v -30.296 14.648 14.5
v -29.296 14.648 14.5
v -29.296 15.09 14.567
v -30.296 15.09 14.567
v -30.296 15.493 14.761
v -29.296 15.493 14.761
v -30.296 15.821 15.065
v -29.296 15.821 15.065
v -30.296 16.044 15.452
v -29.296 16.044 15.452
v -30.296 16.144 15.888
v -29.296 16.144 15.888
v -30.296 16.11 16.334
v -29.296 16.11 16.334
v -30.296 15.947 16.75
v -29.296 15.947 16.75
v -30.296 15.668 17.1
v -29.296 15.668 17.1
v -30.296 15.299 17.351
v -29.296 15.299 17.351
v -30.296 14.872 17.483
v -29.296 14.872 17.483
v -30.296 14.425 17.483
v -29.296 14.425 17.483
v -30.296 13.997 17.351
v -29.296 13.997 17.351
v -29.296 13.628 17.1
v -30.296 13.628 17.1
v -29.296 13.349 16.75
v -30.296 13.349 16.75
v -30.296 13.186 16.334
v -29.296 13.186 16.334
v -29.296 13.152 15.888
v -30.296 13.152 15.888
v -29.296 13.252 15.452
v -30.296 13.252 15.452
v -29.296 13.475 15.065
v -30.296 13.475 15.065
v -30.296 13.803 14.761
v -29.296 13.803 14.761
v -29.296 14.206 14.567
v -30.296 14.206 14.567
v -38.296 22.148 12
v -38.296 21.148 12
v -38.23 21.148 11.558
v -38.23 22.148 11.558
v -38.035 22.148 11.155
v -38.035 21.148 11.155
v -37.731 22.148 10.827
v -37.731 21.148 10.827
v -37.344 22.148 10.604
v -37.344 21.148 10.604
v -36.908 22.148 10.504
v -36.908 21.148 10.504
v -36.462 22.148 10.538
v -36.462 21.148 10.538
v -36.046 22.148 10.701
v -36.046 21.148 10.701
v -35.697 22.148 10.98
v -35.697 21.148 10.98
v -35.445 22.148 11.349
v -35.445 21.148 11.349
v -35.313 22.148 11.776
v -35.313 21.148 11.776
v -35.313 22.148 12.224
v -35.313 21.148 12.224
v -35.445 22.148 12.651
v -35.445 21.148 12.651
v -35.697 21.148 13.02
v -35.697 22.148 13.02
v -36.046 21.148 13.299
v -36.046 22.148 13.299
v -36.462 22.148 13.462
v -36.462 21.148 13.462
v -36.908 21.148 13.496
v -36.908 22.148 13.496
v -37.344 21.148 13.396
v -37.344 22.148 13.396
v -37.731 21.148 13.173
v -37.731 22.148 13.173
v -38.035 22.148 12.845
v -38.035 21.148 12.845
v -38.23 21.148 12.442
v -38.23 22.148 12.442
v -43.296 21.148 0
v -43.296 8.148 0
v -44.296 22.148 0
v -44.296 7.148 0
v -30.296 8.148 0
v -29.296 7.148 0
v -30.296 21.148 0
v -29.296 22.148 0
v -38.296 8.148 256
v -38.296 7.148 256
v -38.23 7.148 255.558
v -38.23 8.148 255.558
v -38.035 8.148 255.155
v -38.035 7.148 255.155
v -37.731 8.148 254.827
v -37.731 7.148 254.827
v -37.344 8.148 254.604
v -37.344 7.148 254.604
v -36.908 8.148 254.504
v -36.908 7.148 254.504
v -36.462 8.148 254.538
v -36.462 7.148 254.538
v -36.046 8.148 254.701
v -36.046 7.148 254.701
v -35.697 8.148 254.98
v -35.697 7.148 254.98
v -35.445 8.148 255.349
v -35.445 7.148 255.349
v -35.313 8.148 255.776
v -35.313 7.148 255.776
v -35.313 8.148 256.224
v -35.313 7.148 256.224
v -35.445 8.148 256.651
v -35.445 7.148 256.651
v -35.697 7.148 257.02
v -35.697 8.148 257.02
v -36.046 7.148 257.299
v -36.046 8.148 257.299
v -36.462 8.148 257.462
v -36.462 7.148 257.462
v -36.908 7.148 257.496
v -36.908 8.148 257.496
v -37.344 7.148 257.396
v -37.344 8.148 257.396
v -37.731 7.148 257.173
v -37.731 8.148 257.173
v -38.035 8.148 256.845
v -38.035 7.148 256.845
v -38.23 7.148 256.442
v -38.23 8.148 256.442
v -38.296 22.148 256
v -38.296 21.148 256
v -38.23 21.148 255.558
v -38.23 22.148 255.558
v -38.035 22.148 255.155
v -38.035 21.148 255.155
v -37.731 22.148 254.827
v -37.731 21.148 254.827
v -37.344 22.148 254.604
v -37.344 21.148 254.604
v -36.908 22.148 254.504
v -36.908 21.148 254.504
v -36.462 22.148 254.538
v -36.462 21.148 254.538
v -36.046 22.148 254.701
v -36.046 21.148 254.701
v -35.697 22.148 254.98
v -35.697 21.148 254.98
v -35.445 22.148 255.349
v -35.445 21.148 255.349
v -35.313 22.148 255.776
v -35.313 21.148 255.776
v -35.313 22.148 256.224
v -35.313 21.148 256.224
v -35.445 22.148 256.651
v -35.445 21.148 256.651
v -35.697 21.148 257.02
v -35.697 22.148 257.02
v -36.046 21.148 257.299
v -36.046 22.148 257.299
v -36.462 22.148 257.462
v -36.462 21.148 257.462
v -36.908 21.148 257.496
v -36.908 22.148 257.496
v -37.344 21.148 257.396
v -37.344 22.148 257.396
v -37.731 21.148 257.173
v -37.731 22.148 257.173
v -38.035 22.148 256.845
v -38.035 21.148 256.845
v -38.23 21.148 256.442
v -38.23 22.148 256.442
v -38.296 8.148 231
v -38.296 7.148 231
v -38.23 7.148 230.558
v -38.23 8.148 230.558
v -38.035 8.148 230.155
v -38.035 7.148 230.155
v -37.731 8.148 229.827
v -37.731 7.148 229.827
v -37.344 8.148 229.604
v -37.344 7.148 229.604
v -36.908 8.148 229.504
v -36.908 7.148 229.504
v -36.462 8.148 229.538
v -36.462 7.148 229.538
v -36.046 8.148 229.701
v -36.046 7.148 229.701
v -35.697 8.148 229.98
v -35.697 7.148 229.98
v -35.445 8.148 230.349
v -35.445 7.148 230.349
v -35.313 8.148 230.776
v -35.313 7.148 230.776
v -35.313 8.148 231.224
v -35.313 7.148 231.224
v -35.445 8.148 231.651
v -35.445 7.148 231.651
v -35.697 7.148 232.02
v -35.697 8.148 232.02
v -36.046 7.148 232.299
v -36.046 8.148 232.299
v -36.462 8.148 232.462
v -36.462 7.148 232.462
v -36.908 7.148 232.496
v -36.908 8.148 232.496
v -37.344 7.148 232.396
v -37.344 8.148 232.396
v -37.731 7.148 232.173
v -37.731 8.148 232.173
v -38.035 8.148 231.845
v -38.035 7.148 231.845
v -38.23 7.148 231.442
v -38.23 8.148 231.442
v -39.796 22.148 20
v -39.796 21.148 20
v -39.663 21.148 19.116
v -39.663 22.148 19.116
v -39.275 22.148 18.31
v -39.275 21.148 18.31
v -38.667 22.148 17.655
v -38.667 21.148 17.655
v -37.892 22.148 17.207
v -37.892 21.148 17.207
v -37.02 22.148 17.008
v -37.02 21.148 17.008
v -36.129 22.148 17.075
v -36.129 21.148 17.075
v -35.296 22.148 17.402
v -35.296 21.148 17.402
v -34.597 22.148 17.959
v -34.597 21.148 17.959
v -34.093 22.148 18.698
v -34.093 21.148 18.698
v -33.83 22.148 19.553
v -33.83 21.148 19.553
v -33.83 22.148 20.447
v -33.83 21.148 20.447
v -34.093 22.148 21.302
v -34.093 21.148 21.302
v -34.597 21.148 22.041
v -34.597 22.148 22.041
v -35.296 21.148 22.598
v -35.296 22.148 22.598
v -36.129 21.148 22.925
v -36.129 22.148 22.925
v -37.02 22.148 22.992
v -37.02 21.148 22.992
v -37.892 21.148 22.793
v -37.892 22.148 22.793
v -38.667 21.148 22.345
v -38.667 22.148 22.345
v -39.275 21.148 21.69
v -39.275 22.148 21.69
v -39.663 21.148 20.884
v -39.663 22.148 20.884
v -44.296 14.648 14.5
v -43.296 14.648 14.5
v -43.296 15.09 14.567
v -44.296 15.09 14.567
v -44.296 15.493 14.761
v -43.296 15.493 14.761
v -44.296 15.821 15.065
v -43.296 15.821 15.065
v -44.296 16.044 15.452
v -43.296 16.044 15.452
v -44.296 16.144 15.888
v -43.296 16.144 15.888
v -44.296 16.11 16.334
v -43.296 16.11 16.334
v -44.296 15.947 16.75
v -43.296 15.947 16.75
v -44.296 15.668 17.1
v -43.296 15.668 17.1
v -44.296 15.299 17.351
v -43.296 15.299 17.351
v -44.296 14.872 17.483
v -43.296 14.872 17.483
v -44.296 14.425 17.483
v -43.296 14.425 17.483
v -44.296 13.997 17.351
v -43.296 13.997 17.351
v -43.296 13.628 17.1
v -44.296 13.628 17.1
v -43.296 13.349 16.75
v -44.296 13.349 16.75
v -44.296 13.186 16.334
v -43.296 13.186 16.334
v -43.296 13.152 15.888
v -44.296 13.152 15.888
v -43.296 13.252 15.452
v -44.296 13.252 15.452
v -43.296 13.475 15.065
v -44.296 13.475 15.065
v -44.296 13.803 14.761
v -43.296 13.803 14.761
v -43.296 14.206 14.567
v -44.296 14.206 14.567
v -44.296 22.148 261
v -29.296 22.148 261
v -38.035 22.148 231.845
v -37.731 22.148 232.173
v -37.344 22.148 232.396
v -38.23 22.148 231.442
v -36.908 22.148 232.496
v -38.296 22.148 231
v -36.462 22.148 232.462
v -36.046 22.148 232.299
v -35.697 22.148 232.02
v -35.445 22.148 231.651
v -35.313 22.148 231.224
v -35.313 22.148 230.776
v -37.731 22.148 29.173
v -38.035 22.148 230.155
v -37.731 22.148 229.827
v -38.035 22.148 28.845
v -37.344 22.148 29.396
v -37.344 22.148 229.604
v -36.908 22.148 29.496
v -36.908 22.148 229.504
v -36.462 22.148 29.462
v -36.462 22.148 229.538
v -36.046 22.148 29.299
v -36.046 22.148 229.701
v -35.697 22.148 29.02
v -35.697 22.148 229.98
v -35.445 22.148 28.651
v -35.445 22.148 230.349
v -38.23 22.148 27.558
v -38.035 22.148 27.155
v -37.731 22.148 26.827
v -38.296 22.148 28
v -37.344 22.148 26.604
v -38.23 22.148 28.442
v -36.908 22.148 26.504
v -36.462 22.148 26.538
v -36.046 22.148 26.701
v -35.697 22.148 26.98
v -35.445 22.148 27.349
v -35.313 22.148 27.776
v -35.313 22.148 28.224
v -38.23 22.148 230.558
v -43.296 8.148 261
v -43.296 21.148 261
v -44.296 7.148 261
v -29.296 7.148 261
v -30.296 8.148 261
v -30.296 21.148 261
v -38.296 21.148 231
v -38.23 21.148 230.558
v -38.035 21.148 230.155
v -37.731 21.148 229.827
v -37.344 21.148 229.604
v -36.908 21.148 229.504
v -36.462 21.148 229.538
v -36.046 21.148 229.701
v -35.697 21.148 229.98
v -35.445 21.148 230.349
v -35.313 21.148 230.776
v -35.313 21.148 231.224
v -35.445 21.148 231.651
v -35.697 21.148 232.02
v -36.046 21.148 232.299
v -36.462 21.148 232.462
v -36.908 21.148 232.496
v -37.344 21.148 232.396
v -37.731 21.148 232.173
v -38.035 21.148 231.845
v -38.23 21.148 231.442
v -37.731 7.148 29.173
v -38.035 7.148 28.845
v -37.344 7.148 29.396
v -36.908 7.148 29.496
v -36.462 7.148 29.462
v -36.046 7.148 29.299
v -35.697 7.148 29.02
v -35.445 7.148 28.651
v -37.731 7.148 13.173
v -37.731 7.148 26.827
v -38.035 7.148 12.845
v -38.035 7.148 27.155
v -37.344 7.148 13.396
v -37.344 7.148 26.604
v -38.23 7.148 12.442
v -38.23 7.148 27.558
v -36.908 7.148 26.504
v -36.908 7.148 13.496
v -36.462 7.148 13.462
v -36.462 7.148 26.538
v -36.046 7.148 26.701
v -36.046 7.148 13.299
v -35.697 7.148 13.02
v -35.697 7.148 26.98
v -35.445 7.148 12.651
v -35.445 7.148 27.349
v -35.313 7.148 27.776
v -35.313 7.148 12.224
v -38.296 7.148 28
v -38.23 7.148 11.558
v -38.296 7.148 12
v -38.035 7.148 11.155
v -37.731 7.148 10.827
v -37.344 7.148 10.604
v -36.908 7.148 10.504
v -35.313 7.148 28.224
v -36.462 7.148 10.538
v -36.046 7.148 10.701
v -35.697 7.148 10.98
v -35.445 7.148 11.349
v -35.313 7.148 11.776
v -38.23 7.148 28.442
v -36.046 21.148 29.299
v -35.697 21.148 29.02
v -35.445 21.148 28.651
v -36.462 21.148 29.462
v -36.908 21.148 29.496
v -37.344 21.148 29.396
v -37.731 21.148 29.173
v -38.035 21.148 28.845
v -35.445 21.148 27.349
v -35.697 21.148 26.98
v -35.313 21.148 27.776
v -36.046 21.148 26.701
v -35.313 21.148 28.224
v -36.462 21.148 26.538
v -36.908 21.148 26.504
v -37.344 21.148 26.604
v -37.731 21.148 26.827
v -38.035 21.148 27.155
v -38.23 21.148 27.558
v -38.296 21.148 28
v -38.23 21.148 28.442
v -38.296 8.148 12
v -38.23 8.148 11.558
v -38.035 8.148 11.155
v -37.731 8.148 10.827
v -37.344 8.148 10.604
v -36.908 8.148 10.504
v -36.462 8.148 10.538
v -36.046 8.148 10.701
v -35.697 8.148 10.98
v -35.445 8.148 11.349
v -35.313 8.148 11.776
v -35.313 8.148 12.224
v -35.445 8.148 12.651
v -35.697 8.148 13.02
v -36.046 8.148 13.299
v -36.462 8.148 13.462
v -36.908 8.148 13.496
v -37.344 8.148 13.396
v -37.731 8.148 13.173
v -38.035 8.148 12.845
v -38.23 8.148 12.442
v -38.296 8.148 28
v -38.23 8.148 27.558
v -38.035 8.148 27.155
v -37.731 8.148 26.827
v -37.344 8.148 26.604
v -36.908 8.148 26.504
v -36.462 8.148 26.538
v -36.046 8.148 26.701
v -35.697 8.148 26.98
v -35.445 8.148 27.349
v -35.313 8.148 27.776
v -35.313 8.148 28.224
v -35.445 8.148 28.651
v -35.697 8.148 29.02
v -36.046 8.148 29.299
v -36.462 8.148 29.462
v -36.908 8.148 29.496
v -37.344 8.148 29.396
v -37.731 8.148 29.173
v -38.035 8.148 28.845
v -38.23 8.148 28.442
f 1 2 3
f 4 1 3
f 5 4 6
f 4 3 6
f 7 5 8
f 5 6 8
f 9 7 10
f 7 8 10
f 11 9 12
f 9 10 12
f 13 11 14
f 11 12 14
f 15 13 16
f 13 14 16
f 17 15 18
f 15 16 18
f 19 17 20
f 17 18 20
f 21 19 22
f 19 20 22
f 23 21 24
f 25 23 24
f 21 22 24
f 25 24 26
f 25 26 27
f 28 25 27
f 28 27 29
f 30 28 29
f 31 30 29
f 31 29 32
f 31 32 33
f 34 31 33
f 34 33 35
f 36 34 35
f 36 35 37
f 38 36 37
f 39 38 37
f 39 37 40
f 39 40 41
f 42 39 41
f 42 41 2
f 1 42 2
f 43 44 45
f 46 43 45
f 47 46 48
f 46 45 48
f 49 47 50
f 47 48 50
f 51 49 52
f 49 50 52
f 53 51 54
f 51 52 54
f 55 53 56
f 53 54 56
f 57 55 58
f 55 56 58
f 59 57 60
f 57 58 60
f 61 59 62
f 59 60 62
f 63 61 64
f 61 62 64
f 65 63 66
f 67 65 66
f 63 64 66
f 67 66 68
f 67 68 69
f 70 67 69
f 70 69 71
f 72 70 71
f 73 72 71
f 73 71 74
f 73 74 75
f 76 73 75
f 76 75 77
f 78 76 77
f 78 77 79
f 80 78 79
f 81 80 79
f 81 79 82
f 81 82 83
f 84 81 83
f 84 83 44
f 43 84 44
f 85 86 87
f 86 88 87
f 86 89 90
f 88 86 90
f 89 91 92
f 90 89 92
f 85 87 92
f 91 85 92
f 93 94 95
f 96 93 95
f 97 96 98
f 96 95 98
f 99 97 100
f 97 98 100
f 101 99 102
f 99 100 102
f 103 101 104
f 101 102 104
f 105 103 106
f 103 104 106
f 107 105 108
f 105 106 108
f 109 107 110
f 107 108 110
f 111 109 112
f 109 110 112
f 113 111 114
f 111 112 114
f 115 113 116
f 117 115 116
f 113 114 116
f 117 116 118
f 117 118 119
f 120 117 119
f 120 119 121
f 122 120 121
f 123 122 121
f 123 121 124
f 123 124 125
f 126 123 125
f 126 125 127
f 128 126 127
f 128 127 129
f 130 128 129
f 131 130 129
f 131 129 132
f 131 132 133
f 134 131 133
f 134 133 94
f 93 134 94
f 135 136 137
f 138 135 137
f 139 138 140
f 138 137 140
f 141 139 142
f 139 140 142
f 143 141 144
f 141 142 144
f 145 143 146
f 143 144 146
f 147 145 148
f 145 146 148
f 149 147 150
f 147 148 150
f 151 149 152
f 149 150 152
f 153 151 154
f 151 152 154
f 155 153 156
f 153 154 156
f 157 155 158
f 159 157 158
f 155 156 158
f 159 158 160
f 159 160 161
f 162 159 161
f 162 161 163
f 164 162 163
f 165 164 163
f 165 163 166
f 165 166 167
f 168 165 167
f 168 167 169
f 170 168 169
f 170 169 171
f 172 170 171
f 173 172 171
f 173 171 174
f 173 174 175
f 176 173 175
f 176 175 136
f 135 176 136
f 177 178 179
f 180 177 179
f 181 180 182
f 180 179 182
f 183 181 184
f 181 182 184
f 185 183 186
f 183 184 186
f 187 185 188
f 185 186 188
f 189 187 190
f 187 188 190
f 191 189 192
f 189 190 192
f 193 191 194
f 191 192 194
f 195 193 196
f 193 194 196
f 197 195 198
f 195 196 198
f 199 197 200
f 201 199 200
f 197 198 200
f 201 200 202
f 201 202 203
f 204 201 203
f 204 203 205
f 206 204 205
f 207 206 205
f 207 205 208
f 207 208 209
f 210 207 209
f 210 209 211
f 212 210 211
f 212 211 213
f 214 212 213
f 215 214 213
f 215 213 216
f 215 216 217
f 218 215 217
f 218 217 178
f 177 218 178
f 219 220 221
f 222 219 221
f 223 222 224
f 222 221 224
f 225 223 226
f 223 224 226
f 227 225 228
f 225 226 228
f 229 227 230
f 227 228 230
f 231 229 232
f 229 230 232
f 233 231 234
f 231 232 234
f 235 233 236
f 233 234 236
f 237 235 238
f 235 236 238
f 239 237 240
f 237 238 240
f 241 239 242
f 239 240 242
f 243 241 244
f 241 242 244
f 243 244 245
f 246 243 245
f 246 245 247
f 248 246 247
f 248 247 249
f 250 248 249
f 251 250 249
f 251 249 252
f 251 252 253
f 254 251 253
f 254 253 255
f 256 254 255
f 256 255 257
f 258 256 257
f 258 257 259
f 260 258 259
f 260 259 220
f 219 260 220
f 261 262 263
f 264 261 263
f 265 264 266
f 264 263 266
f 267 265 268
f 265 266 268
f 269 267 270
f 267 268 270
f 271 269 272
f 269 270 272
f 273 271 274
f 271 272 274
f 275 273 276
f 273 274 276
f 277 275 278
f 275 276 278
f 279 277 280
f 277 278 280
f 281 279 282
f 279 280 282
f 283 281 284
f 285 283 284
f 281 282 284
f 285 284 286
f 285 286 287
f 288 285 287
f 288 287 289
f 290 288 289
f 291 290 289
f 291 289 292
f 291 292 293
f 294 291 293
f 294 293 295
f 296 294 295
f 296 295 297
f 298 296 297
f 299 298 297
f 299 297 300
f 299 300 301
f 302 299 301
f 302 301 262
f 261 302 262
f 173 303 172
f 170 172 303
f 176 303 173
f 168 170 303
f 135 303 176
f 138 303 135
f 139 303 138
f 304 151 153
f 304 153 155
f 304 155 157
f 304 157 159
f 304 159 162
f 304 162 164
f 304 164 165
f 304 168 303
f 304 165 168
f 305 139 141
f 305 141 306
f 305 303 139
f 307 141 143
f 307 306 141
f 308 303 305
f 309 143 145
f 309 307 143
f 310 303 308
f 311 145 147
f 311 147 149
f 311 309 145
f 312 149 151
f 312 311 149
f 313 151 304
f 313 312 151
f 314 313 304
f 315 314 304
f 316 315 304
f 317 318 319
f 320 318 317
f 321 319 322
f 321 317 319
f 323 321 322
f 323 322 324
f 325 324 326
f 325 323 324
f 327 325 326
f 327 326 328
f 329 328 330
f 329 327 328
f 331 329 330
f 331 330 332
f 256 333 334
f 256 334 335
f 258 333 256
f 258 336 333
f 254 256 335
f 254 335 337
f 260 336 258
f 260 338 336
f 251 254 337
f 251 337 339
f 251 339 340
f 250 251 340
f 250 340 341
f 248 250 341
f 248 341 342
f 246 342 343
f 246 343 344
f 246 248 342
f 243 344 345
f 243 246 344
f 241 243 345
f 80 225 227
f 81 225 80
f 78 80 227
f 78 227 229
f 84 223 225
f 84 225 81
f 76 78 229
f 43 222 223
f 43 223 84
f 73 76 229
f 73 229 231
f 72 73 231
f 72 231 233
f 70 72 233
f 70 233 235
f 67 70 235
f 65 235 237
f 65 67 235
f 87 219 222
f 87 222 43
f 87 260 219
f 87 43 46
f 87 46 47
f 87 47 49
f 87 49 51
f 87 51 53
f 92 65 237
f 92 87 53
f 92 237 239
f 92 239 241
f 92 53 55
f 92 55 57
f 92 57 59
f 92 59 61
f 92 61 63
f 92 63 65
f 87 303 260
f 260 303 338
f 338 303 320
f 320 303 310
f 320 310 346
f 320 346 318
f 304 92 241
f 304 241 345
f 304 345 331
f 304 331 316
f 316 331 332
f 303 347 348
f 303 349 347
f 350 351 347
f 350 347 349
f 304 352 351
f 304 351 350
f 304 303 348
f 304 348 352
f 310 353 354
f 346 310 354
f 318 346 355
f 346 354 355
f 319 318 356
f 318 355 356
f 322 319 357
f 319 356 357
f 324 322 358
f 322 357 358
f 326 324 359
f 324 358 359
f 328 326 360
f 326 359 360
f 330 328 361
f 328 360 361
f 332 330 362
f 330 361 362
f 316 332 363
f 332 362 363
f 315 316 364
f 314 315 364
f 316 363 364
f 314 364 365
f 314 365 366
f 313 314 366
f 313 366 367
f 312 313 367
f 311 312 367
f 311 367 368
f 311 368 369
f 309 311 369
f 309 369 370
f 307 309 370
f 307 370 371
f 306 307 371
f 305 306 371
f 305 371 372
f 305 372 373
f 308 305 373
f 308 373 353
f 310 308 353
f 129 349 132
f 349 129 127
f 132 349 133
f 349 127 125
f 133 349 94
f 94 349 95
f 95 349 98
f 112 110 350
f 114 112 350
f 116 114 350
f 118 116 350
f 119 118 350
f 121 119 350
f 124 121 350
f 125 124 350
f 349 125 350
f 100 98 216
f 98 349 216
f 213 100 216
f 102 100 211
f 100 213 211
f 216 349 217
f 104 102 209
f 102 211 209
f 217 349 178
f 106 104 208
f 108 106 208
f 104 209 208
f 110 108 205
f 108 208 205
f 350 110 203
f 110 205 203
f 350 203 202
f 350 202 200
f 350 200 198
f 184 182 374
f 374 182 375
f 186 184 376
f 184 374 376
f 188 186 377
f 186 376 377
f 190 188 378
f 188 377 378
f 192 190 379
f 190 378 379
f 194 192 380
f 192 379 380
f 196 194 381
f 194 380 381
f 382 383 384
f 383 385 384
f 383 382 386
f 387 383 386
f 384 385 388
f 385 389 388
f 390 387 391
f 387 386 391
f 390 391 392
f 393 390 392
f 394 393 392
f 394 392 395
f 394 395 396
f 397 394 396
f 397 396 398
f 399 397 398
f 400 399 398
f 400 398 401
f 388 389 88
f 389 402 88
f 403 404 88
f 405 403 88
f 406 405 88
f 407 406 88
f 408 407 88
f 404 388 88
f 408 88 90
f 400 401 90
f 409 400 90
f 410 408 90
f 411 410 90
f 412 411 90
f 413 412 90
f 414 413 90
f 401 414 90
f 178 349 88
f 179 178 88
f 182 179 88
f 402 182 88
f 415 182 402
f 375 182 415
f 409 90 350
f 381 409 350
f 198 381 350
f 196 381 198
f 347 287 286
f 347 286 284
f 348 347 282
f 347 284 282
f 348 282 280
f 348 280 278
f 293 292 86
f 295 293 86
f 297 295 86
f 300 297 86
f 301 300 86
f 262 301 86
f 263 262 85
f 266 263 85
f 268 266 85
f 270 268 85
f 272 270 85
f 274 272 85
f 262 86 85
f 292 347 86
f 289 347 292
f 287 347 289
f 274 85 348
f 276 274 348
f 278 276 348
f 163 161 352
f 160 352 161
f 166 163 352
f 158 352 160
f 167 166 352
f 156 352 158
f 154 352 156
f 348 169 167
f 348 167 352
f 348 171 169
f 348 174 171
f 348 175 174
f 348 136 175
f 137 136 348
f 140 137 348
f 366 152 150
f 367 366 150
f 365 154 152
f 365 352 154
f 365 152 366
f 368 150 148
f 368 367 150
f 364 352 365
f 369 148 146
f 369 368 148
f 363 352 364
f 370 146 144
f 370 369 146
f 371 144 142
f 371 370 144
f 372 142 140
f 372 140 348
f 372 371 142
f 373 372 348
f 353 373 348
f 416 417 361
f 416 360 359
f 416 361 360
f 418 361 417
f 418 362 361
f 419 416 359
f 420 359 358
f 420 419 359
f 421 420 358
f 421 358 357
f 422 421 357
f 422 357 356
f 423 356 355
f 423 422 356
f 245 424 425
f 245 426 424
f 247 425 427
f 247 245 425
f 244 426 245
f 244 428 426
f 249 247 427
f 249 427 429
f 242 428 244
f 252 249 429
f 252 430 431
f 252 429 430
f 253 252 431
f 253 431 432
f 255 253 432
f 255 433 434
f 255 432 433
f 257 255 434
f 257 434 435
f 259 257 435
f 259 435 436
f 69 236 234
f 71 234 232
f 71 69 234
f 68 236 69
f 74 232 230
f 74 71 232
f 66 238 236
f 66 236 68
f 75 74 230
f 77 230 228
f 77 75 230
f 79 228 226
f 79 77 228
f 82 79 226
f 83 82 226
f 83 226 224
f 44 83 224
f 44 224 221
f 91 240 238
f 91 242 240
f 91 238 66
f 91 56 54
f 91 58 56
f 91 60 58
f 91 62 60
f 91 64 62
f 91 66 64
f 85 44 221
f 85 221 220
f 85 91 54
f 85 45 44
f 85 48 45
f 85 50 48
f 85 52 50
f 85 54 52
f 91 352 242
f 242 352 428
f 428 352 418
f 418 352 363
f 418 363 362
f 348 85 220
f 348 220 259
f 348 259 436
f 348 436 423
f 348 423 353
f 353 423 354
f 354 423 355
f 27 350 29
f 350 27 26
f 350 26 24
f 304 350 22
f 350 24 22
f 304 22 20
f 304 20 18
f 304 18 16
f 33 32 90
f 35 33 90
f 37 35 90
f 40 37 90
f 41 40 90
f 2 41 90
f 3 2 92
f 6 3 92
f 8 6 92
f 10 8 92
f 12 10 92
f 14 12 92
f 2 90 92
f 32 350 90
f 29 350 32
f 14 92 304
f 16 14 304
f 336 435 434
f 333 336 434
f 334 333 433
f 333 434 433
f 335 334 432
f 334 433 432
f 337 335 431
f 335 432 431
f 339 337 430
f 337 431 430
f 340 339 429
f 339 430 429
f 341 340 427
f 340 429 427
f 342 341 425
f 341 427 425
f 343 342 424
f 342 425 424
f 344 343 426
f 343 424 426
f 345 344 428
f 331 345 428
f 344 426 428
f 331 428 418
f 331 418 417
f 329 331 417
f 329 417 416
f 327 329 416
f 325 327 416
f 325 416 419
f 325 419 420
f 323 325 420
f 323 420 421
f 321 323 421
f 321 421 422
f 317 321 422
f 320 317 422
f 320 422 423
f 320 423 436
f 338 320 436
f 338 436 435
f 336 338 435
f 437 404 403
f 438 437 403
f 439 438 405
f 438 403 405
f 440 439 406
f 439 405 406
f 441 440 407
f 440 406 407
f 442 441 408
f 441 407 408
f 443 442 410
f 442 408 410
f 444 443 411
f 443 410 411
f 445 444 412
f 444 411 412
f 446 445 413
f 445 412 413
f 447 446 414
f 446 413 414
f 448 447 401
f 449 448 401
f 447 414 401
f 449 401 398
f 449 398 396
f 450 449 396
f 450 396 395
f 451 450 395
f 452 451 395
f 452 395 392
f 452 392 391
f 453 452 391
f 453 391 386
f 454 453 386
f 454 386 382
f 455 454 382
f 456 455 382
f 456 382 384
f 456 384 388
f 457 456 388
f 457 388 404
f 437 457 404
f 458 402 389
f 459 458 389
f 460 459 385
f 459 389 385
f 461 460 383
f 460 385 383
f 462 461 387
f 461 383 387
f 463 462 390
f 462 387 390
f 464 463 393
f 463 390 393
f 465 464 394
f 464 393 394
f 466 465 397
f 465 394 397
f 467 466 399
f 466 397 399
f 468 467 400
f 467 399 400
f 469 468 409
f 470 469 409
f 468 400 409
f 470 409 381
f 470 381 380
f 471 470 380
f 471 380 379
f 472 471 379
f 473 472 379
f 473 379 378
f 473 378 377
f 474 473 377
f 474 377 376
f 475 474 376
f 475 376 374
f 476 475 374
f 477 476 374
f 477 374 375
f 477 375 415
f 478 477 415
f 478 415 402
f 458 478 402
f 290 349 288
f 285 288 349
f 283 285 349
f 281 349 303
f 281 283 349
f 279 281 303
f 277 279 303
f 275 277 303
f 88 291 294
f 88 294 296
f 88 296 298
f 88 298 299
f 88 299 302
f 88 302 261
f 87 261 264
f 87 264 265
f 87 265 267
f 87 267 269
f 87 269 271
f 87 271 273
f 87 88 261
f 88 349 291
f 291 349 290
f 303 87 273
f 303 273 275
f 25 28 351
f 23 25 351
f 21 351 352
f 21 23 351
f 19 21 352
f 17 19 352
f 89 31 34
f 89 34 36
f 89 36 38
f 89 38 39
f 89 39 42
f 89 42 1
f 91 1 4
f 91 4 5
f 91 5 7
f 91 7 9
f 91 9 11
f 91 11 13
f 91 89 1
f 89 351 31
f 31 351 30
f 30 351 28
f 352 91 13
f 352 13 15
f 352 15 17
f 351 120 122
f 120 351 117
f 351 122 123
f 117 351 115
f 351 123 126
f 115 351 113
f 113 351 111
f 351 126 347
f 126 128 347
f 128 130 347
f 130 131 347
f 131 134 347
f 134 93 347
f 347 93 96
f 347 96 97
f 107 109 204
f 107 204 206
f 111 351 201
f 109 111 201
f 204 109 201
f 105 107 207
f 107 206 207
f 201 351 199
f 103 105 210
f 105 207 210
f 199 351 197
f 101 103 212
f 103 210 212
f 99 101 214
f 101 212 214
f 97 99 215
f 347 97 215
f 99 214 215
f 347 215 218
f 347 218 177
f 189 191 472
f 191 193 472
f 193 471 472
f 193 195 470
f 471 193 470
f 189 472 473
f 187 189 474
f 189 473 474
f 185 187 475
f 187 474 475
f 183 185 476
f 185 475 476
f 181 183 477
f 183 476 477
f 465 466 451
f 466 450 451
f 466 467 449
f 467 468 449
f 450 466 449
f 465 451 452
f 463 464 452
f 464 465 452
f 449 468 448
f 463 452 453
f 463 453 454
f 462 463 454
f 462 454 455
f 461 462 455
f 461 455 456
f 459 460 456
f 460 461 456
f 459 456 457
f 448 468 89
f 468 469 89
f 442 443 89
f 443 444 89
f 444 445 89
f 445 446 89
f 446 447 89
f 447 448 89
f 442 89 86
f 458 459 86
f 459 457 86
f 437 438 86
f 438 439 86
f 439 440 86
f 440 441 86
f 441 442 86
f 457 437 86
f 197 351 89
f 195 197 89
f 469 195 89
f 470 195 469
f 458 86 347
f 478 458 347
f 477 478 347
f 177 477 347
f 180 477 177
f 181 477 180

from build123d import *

# Parameters (mm, degrees)
SKETCH1_W                    = 15
SKETCH1_H                    = 15
BOSS_EXTRUDE1_DEPTH          = 261
SKETCH2_W                    = 13
SKETCH2_H                    = 13
CUT_EXTRUDE1_DEPTH           = 261
F_3_0_3_DIAMETER_HOLE1_D     = 3
F_3_0_3_DIAMETER_HOLE2_D     = 3
F_6_0_6_DIAMETER_HOLE1_D     = 6
F_6_0_6_DIAMETER_HOLE1_DEPTH = 10
F_6_0_6_DIAMETER_HOLE1_TIP   = 1.802581857
F_3_0_3_DIAMETER_HOLE3_D     = 3


with BuildPart() as part:
    # Sketch1 → Boss-Extrude1 (new body)
    with BuildSketch(Plane.XY):
        with Locations((-36.796141786, 14.648070893)):
            Rectangle(SKETCH1_W, SKETCH1_H)
    extrude(amount=BOSS_EXTRUDE1_DEPTH)

    # Sketch2 → Cut-Extrude1 (cut)
    with BuildSketch(Plane(origin=(0, 0, 0), x_dir=(-1, 0, 0), z_dir=(0, 0, -1))):
        with Locations((36.796141786, 14.648070893)):
            Rectangle(SKETCH2_W, SKETCH2_H)
    extrude(amount=-CUT_EXTRUDE1_DEPTH, mode=Mode.SUBTRACT)

    # Ø3.0 (3) Diameter Hole1 (through all)
    with Locations(Plane(origin=(0, 22.148070893, 0), x_dir=(1, 0, 0), z_dir=(0, 1, 0))):
        with Locations((-36.796141786, -256), (-36.796141786, -231)):
            Hole(F_3_0_3_DIAMETER_HOLE1_D / 2)

    # Ø3.0 (3) Diameter Hole2 (through all)
    with Locations(Plane(origin=(0, 22.148070893, 0), x_dir=(1, 0, 0), z_dir=(0, 1, 0))):
        with Locations((-36.796141786, -12), (-36.796141786, -28)):
            Hole(F_3_0_3_DIAMETER_HOLE2_D / 2)

    # Ø6.0 (6) Diameter Hole1
    with Locations(Plane(origin=(0, 22.148070893, 0), x_dir=(1, 0, 0), z_dir=(0, 1, 0))):
        with Locations((-36.796141786, -20)):
            Hole(F_6_0_6_DIAMETER_HOLE1_D / 2, depth=F_6_0_6_DIAMETER_HOLE1_DEPTH)
            with Locations((0, 0, -(F_6_0_6_DIAMETER_HOLE1_DEPTH + F_6_0_6_DIAMETER_HOLE1_TIP / 2))):  # 118° drill point
                Cone(0, F_6_0_6_DIAMETER_HOLE1_D / 2, F_6_0_6_DIAMETER_HOLE1_TIP, mode=Mode.SUBTRACT)

    # Ø3.0 (3) Diameter Hole3 (through all)
    with Locations(Plane.ZY.offset(44.296141786)):
        with Locations((16, 14.648070893)):
            Hole(F_3_0_3_DIAMETER_HOLE3_D / 2)


solid = part.part
